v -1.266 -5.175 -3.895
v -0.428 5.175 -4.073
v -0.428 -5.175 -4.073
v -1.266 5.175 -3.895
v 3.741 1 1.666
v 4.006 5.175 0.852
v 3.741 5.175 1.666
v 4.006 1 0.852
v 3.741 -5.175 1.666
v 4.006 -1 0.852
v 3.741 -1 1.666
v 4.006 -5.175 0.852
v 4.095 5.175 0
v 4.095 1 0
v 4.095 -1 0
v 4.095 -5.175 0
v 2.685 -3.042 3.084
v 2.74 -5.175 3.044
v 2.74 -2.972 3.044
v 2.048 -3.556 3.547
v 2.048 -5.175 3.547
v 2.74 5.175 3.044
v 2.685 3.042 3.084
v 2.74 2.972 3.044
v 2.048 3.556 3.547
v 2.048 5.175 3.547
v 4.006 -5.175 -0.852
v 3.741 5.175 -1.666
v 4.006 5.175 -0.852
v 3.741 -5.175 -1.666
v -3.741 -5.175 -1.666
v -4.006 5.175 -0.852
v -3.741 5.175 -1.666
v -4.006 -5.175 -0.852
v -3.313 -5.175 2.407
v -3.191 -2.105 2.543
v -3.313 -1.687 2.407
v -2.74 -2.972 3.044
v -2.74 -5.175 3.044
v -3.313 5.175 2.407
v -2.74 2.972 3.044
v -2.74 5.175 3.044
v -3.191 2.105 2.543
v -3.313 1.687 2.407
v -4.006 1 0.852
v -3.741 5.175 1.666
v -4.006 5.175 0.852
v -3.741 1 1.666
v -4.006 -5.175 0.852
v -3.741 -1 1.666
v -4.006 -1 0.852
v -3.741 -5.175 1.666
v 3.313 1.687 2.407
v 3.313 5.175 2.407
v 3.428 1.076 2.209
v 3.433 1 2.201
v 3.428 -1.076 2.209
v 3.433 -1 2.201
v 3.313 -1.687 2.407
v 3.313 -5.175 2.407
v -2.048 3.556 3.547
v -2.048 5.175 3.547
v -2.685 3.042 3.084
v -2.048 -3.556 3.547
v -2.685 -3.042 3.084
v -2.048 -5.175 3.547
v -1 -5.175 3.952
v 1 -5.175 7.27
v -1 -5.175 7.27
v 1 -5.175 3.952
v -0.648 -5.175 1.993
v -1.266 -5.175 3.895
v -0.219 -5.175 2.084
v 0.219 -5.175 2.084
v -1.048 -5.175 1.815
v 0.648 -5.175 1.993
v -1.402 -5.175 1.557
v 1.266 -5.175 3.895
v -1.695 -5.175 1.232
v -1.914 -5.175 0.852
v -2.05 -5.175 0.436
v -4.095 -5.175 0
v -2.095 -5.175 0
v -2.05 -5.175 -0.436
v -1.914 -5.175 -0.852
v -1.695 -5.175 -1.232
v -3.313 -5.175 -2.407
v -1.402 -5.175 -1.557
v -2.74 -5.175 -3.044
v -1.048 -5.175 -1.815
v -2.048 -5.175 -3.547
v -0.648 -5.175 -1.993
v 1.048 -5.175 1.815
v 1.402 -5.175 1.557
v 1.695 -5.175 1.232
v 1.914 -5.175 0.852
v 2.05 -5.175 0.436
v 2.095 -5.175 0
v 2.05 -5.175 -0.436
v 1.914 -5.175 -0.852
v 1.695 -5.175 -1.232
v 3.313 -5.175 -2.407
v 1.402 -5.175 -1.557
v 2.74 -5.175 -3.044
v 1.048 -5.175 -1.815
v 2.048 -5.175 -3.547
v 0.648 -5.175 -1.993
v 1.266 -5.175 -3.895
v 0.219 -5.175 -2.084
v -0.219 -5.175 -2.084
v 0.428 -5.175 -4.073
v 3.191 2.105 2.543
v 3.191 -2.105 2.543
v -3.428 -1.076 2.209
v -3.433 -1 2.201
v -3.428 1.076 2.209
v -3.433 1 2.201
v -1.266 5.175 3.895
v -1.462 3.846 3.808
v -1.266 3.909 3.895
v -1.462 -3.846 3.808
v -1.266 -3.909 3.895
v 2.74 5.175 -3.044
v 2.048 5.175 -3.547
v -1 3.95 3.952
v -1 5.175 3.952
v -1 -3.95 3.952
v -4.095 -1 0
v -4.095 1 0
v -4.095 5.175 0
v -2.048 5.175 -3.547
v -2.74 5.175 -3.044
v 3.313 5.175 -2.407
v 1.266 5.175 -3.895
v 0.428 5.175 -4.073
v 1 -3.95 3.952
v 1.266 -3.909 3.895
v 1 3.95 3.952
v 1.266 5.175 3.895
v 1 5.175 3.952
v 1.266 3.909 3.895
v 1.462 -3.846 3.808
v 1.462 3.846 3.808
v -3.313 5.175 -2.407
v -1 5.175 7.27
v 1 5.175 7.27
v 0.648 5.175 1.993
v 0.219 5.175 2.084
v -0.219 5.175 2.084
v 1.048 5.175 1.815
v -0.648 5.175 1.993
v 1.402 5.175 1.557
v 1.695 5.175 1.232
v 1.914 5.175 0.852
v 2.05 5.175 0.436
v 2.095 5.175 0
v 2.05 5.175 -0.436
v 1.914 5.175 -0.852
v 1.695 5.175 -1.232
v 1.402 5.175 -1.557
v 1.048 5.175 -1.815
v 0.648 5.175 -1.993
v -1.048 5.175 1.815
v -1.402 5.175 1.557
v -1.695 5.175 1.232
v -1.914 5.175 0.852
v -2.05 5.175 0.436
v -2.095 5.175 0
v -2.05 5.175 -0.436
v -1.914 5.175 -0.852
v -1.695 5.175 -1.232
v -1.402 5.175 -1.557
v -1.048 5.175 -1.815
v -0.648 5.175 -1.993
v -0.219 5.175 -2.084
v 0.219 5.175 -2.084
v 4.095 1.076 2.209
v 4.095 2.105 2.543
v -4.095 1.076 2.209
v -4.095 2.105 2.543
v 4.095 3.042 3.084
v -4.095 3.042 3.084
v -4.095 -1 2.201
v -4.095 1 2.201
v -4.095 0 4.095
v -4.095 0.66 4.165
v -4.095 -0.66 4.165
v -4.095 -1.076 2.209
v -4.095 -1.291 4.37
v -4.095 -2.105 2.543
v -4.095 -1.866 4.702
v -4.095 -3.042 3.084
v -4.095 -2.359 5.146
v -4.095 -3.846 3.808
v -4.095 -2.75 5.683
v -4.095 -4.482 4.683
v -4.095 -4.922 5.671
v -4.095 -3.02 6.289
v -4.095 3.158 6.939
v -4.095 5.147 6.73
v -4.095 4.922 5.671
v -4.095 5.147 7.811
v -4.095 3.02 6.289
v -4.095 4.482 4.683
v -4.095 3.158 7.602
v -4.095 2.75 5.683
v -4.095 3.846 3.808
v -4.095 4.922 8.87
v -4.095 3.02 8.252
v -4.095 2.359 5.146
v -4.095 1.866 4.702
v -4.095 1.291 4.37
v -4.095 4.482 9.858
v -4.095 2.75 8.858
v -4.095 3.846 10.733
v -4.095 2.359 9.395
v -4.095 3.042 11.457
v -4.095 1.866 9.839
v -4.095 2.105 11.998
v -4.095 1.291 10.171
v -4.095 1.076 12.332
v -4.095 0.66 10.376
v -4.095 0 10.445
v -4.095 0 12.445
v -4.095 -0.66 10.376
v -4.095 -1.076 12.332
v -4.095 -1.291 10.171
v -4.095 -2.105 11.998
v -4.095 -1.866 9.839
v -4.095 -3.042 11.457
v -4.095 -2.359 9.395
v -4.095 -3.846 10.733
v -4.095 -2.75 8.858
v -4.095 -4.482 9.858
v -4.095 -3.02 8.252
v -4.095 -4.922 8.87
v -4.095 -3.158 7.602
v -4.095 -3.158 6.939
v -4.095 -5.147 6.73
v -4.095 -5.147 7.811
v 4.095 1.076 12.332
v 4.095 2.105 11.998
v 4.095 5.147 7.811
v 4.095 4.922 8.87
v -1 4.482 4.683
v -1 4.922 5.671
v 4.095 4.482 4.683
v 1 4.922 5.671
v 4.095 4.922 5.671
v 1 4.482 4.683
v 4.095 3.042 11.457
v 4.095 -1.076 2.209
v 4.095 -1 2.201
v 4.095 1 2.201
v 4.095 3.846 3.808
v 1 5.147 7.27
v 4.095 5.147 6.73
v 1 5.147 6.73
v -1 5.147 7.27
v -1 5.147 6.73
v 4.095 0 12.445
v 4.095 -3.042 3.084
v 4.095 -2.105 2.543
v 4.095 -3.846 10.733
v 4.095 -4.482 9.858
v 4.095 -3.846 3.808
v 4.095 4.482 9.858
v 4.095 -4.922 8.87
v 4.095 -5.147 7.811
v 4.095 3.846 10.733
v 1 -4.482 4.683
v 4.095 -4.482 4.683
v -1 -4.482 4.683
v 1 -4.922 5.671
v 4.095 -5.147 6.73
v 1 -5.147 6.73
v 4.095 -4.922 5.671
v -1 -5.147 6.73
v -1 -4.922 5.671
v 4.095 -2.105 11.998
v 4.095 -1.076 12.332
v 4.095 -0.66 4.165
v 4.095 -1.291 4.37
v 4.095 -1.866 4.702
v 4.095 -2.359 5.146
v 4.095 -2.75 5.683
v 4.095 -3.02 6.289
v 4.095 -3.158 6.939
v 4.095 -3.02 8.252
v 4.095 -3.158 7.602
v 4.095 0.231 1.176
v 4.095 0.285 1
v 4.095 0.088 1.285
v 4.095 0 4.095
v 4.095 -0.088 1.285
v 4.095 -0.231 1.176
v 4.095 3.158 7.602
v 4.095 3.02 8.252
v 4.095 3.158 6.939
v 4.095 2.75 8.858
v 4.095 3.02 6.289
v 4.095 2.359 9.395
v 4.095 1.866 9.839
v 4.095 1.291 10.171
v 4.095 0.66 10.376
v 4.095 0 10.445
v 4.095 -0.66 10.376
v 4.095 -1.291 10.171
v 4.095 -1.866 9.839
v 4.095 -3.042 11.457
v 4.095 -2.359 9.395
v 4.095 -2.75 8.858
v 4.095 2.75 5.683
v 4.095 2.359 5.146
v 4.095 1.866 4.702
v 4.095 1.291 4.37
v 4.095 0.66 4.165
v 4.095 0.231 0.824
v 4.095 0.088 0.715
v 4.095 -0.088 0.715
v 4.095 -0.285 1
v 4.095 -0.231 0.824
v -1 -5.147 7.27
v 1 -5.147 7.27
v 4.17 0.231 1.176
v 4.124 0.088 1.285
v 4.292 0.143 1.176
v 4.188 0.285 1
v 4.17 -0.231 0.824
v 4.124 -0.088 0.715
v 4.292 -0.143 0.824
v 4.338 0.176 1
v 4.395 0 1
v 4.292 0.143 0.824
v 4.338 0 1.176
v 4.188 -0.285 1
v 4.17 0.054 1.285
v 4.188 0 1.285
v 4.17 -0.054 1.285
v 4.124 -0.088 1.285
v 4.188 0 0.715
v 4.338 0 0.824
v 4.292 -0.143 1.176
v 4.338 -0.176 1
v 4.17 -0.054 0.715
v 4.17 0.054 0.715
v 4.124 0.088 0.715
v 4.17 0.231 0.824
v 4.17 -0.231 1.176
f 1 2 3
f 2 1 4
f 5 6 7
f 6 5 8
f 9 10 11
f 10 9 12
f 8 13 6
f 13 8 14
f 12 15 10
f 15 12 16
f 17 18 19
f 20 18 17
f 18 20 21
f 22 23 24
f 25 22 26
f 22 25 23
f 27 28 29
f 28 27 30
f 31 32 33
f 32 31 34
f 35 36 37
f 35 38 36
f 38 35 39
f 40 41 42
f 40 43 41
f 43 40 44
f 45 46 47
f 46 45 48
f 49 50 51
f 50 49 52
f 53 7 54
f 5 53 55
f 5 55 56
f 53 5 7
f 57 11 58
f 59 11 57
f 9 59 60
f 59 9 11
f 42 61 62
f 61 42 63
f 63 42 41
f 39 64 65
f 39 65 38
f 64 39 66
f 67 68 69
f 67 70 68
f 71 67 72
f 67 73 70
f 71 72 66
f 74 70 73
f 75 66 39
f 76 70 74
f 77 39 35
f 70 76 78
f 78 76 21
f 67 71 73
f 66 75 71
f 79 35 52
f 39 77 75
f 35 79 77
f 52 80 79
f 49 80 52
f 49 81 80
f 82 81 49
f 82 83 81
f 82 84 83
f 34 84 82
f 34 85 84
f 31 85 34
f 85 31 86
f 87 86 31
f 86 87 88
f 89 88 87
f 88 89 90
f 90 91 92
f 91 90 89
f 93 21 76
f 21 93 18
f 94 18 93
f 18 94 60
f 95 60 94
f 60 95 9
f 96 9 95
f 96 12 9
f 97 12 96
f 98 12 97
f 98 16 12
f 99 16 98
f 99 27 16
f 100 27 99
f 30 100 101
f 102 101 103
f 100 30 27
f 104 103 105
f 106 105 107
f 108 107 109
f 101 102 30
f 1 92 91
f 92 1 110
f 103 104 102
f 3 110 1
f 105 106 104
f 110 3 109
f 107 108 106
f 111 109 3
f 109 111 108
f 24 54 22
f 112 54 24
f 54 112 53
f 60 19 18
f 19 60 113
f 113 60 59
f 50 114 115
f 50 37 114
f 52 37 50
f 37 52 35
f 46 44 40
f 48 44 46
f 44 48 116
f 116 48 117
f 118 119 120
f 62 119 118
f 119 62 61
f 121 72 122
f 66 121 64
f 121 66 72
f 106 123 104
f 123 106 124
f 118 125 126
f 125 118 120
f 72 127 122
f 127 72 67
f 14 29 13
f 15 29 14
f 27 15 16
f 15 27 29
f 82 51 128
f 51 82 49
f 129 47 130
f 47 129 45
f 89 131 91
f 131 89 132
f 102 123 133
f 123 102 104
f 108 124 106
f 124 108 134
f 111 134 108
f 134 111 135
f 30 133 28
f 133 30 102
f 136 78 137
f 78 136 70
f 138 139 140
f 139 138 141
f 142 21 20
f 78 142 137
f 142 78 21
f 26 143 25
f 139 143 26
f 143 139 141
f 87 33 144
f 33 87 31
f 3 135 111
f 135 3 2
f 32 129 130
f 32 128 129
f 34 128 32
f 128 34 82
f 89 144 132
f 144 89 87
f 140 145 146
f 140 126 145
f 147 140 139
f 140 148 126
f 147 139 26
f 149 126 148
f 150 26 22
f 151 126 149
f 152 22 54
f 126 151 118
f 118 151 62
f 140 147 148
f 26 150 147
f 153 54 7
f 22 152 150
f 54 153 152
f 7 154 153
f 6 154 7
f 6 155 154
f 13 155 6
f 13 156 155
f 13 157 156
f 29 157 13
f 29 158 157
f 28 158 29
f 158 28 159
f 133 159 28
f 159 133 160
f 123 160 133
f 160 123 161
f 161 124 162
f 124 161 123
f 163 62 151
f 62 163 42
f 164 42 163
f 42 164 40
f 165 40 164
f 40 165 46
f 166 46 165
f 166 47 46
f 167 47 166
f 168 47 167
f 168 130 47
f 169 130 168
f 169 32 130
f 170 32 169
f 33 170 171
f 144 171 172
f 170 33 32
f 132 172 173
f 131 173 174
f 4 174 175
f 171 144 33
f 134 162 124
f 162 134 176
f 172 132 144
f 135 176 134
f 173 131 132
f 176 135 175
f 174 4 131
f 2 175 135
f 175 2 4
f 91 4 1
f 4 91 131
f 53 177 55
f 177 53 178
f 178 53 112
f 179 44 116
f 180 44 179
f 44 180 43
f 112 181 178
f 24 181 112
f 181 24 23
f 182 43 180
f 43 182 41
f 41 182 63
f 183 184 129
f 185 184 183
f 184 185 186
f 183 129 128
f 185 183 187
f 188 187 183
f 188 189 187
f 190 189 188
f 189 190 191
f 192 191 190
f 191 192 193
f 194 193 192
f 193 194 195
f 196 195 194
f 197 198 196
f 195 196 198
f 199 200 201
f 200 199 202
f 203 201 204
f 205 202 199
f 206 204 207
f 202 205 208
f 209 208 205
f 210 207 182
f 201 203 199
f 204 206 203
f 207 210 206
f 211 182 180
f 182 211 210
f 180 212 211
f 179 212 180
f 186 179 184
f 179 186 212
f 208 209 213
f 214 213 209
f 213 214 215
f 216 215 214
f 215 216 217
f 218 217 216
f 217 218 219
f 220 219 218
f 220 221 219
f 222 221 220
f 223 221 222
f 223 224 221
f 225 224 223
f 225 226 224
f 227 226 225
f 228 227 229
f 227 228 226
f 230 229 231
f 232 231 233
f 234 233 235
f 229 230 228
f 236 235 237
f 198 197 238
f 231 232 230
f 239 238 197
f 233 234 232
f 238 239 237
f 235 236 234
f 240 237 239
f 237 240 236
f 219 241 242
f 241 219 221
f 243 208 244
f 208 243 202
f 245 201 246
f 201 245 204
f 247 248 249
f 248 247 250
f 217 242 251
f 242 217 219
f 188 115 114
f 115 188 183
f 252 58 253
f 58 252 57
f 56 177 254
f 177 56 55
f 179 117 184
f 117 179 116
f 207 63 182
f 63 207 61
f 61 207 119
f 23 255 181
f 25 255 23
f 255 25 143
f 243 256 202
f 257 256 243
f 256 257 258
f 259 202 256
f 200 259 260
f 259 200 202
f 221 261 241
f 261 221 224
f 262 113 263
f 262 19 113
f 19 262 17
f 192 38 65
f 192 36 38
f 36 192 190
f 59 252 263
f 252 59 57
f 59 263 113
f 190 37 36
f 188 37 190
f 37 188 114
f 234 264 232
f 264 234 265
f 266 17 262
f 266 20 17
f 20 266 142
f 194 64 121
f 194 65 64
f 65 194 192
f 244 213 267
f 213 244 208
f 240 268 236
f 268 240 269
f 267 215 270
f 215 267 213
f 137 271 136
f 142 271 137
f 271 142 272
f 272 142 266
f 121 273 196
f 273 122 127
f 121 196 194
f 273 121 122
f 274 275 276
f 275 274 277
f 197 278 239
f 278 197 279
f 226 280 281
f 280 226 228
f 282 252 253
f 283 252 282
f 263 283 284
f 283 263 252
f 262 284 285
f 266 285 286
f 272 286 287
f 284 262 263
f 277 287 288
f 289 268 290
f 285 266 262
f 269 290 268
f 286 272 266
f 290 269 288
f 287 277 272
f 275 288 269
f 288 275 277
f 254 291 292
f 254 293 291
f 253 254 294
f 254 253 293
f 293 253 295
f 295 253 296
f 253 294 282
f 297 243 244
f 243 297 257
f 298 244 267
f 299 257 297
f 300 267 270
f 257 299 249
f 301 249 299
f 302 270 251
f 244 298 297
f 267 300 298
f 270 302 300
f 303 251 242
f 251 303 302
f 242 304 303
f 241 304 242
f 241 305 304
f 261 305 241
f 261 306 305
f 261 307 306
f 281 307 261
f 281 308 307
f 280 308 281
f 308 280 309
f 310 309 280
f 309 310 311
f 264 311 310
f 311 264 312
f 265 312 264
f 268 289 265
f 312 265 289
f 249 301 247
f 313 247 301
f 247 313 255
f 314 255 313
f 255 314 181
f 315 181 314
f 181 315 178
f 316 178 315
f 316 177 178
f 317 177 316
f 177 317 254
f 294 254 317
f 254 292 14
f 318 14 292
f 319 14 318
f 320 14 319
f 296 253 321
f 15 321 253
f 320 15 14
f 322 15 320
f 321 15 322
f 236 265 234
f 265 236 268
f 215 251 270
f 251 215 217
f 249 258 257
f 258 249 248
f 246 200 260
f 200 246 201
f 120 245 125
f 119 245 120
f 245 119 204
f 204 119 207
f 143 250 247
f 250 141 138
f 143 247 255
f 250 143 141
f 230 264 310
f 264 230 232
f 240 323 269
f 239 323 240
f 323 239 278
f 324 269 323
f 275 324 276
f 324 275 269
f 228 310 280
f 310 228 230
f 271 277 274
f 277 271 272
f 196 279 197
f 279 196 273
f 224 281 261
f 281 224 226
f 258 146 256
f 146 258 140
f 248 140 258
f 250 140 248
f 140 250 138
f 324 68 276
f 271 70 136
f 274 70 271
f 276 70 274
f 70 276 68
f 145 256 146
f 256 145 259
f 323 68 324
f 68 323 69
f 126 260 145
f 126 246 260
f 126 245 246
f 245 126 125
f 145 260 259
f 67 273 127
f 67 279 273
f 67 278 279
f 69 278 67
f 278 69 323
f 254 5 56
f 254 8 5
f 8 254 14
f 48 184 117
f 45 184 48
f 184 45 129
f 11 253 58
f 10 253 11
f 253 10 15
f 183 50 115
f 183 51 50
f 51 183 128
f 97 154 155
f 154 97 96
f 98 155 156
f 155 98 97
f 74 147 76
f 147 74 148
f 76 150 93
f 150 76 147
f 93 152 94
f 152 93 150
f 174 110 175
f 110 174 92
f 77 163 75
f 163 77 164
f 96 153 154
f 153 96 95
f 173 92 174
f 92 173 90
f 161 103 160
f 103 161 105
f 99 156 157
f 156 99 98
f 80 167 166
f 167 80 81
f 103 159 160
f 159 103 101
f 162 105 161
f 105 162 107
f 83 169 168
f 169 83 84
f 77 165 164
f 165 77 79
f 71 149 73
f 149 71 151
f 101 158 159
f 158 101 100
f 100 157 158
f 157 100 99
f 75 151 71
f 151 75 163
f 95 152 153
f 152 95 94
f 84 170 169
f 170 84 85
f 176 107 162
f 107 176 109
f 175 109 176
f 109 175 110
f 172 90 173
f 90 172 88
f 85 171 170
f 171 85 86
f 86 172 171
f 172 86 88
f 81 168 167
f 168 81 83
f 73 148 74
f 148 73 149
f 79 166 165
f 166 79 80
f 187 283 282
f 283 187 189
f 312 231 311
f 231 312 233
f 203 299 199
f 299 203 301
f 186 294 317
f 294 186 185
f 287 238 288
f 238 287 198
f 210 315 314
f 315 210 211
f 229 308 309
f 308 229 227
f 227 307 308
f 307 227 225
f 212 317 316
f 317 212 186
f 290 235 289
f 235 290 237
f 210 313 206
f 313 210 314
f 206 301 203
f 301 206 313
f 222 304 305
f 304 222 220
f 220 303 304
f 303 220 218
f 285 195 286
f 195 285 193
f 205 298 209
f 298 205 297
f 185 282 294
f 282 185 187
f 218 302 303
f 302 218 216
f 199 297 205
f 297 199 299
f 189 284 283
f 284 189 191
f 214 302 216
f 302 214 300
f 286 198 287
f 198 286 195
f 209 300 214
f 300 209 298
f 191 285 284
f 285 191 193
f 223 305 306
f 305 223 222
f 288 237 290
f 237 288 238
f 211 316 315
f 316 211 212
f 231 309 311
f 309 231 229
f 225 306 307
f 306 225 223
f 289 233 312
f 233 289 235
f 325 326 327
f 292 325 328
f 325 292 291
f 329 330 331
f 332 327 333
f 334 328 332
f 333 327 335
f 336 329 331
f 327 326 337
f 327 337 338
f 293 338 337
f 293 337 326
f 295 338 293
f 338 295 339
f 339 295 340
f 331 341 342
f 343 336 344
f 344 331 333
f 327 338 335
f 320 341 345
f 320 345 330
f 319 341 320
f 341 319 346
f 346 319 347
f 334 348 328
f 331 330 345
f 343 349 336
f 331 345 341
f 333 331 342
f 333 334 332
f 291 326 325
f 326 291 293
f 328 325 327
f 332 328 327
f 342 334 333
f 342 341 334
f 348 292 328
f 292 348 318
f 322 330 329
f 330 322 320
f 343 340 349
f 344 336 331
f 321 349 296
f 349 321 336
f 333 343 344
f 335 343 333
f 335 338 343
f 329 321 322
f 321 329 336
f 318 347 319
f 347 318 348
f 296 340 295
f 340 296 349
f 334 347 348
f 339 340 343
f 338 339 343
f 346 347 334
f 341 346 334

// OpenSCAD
// Copyright 2010 David Watson <david@neonquill.com>
// This work is licensed under the
//  Creative Commons Attribution-ShareAlike 3.0 Unported License. 
//  http://creativecommons.org/licenses/by-sa/3.0/

$fs = 0.2;

in_to_mm = 25.4;

// Design parameters.
dowel_radius = (0.25 * in_to_mm) / 2.0;
screw_radius = ((0.164 + 0.001) * in_to_mm) / 2.0;
wall_thickness = 2.0;

// Calculated parameters.
dowel_total_radius = dowel_radius + wall_thickness;
screw_total_radius = screw_radius + wall_thickness;

dowel_vert_offset = screw_total_radius + dowel_radius;


module solid() {

	// Screw for 8-32
	rotate(a=[90, 0, 0]) {
		translate([0, 0, -dowel_total_radius]) {
			cylinder(h=dowel_total_radius*2, r=screw_total_radius);
		}
	}
	// 1/4" dowel
	translate([0, 0, dowel_vert_offset]) {
		rotate(a=[0, 90, 0]) {
			translate([0, 0, -screw_total_radius]) {
				cylinder(h=screw_total_radius * 2, r=dowel_total_radius);
			}
		}
	}

	translate([-1, -dowel_total_radius, screw_radius]) {
		cube(size=[2, dowel_total_radius*2, dowel_total_radius]);
	}

	translate([-screw_total_radius, -1, 0]) {
		cube(size=[screw_total_radius * 2, 2, screw_total_radius]);
	}
}

module hinge() {
	difference() {
		solid();

		// Screw for 8-32.
		rotate(a=[90, 0, 0]) {
			translate([0, 0, -9]) {
				cylinder(h=9*2, r=screw_radius);
			}
		}

		// 1/4" dowel
		translate([0, 0, dowel_vert_offset]) {
			rotate(a=[0, 90, 0]) {
				translate([0, 0, -10]) {
					cylinder(h=20, r=dowel_radius);
				}
			}
		}
	}
}

module rev_dot() {
	translate([screw_total_radius, 0, 1]) {
		sphere(r=0.3);
	}
}

union() {
	hinge();
	rev_dot();
}
